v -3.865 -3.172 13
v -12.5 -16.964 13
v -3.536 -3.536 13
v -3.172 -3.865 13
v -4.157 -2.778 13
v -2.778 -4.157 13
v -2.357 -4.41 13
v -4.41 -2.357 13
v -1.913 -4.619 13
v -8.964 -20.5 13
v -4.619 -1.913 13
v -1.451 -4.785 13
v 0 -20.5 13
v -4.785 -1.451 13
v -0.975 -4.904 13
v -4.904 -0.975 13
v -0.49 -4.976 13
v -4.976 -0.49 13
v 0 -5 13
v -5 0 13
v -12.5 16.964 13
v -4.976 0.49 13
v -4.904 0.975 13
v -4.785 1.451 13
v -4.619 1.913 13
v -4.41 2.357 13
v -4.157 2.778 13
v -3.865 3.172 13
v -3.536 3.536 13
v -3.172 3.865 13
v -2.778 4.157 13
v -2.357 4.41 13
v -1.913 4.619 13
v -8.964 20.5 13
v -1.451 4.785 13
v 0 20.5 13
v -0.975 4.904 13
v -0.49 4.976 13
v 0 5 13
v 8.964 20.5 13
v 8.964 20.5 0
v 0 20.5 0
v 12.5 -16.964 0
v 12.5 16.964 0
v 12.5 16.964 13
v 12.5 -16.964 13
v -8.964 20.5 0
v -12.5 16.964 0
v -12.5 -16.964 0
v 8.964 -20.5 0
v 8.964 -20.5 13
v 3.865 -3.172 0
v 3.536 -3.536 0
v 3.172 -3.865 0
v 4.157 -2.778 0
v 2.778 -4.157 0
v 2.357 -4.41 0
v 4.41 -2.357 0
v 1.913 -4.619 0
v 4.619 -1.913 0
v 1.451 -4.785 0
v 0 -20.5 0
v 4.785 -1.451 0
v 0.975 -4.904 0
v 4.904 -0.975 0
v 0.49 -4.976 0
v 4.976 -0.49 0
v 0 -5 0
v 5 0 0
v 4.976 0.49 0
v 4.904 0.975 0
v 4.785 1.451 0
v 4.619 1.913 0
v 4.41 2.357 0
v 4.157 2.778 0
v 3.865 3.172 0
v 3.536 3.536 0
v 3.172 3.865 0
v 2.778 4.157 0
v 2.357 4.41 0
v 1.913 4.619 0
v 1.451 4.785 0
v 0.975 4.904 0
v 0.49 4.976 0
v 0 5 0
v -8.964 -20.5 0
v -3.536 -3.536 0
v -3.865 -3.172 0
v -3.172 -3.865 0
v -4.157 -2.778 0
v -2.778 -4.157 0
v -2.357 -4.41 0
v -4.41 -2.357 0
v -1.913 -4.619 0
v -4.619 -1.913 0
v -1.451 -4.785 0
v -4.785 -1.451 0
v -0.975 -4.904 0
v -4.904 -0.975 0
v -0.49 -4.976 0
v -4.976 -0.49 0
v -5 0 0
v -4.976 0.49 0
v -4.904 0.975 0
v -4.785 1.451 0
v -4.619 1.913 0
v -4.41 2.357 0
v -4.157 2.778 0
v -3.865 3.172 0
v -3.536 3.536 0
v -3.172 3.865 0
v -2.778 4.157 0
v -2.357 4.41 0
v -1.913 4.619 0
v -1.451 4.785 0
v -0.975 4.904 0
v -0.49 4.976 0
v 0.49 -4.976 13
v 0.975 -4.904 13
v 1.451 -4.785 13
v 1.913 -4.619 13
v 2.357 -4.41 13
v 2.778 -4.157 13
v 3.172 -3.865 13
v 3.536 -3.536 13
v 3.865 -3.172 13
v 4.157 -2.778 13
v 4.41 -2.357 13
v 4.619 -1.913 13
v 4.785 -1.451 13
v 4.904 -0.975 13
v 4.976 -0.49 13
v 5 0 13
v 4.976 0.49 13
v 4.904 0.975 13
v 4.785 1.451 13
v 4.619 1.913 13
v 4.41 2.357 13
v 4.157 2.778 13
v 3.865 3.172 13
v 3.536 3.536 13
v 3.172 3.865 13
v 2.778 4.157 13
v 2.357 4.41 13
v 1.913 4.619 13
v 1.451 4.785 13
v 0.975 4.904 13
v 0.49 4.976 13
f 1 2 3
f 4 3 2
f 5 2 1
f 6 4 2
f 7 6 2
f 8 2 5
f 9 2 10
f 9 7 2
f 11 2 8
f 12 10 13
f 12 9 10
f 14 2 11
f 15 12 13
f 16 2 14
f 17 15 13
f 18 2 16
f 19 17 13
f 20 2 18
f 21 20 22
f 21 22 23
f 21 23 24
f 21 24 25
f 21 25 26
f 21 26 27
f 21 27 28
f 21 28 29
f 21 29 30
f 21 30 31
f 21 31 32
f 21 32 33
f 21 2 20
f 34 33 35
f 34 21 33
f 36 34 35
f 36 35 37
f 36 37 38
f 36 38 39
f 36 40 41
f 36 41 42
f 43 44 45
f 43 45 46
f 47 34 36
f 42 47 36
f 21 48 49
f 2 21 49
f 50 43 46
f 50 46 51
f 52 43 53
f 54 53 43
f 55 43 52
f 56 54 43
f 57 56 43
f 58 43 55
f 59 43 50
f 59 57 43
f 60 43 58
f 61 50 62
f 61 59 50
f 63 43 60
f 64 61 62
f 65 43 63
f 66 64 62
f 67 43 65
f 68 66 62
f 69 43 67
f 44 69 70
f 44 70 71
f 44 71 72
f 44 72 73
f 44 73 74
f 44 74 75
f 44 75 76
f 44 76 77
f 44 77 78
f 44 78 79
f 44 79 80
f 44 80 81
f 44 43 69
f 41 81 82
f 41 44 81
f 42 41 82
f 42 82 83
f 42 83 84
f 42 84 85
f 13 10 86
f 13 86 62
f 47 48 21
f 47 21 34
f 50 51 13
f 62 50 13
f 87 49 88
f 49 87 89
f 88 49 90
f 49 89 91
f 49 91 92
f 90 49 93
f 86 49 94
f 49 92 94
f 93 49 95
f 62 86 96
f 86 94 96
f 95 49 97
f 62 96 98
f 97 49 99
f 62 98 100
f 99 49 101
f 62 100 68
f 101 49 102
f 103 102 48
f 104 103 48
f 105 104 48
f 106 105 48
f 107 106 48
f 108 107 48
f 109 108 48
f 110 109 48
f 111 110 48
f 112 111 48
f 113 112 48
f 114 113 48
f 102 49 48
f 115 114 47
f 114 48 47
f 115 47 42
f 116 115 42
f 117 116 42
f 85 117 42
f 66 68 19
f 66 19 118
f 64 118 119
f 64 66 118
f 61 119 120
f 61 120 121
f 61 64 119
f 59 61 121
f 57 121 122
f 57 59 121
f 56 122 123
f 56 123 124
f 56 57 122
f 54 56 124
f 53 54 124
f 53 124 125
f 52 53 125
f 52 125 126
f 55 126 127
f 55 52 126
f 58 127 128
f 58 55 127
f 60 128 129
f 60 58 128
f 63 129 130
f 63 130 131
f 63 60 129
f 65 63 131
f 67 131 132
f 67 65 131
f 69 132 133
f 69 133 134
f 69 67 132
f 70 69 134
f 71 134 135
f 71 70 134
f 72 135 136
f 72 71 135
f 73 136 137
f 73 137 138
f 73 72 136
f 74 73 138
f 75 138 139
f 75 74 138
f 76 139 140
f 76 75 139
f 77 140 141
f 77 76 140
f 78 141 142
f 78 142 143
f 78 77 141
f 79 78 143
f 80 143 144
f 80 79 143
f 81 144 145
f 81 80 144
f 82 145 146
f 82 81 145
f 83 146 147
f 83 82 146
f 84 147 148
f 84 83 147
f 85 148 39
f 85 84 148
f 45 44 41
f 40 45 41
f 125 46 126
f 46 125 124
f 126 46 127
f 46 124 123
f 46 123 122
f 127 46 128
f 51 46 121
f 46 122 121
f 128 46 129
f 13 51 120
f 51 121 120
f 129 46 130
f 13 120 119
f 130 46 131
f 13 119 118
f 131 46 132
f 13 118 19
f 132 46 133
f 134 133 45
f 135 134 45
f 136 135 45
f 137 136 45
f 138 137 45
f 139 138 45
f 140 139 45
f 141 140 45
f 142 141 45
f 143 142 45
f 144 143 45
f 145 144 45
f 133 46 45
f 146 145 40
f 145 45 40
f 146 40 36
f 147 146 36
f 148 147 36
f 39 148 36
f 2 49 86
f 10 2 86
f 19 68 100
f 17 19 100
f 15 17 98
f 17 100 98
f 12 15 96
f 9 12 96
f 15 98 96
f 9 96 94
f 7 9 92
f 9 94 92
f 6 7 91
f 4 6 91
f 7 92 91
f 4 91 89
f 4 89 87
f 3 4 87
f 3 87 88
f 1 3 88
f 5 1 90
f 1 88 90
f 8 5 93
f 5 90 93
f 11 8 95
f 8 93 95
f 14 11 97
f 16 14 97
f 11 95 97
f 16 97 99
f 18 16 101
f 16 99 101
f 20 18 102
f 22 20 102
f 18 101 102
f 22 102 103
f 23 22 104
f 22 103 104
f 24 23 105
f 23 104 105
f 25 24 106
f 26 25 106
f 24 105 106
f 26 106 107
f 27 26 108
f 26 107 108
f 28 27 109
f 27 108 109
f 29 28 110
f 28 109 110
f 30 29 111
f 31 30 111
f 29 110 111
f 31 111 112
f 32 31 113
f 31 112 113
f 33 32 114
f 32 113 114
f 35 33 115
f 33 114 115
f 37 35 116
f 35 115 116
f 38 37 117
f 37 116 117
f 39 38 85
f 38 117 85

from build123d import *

# Parameters (mm, degrees)
PAD_DEPTH = 13


with BuildPart() as part:
    # Sketch → Pad (new body)
    with BuildSketch(Plane.XY):
        with BuildLine():
            ThreePointArc((0, -5), (5, 0), (0, 5))
            Line((0, 20.5), (0, 5))
            Line((8.964466, 20.5), (0, 20.5))
            Line((10.732233, 18.732233), (8.964466, 20.5))
            Line((10.732233, 18.732233), (12.5, 16.964466))
            Line((12.5, 16.964466), (12.5, -16.964466))
            Line((12.5, -16.964466), (10.732233, -18.732233))
            Line((10.732233, -18.732233), (8.964466, -20.5))
            Line((8.964466, -20.5), (0, -20.5))
            Line((0, -5), (0, -20.5))
        make_face()
    pad = extrude(amount=PAD_DEPTH)

    # Mirrored: Pad across Sketch V_Axis
    add(pad.mirror(Plane(origin=(0, 0, 0), x_dir=(0, 0, 1), z_dir=(1, 0, 0))))


solid = part.part
